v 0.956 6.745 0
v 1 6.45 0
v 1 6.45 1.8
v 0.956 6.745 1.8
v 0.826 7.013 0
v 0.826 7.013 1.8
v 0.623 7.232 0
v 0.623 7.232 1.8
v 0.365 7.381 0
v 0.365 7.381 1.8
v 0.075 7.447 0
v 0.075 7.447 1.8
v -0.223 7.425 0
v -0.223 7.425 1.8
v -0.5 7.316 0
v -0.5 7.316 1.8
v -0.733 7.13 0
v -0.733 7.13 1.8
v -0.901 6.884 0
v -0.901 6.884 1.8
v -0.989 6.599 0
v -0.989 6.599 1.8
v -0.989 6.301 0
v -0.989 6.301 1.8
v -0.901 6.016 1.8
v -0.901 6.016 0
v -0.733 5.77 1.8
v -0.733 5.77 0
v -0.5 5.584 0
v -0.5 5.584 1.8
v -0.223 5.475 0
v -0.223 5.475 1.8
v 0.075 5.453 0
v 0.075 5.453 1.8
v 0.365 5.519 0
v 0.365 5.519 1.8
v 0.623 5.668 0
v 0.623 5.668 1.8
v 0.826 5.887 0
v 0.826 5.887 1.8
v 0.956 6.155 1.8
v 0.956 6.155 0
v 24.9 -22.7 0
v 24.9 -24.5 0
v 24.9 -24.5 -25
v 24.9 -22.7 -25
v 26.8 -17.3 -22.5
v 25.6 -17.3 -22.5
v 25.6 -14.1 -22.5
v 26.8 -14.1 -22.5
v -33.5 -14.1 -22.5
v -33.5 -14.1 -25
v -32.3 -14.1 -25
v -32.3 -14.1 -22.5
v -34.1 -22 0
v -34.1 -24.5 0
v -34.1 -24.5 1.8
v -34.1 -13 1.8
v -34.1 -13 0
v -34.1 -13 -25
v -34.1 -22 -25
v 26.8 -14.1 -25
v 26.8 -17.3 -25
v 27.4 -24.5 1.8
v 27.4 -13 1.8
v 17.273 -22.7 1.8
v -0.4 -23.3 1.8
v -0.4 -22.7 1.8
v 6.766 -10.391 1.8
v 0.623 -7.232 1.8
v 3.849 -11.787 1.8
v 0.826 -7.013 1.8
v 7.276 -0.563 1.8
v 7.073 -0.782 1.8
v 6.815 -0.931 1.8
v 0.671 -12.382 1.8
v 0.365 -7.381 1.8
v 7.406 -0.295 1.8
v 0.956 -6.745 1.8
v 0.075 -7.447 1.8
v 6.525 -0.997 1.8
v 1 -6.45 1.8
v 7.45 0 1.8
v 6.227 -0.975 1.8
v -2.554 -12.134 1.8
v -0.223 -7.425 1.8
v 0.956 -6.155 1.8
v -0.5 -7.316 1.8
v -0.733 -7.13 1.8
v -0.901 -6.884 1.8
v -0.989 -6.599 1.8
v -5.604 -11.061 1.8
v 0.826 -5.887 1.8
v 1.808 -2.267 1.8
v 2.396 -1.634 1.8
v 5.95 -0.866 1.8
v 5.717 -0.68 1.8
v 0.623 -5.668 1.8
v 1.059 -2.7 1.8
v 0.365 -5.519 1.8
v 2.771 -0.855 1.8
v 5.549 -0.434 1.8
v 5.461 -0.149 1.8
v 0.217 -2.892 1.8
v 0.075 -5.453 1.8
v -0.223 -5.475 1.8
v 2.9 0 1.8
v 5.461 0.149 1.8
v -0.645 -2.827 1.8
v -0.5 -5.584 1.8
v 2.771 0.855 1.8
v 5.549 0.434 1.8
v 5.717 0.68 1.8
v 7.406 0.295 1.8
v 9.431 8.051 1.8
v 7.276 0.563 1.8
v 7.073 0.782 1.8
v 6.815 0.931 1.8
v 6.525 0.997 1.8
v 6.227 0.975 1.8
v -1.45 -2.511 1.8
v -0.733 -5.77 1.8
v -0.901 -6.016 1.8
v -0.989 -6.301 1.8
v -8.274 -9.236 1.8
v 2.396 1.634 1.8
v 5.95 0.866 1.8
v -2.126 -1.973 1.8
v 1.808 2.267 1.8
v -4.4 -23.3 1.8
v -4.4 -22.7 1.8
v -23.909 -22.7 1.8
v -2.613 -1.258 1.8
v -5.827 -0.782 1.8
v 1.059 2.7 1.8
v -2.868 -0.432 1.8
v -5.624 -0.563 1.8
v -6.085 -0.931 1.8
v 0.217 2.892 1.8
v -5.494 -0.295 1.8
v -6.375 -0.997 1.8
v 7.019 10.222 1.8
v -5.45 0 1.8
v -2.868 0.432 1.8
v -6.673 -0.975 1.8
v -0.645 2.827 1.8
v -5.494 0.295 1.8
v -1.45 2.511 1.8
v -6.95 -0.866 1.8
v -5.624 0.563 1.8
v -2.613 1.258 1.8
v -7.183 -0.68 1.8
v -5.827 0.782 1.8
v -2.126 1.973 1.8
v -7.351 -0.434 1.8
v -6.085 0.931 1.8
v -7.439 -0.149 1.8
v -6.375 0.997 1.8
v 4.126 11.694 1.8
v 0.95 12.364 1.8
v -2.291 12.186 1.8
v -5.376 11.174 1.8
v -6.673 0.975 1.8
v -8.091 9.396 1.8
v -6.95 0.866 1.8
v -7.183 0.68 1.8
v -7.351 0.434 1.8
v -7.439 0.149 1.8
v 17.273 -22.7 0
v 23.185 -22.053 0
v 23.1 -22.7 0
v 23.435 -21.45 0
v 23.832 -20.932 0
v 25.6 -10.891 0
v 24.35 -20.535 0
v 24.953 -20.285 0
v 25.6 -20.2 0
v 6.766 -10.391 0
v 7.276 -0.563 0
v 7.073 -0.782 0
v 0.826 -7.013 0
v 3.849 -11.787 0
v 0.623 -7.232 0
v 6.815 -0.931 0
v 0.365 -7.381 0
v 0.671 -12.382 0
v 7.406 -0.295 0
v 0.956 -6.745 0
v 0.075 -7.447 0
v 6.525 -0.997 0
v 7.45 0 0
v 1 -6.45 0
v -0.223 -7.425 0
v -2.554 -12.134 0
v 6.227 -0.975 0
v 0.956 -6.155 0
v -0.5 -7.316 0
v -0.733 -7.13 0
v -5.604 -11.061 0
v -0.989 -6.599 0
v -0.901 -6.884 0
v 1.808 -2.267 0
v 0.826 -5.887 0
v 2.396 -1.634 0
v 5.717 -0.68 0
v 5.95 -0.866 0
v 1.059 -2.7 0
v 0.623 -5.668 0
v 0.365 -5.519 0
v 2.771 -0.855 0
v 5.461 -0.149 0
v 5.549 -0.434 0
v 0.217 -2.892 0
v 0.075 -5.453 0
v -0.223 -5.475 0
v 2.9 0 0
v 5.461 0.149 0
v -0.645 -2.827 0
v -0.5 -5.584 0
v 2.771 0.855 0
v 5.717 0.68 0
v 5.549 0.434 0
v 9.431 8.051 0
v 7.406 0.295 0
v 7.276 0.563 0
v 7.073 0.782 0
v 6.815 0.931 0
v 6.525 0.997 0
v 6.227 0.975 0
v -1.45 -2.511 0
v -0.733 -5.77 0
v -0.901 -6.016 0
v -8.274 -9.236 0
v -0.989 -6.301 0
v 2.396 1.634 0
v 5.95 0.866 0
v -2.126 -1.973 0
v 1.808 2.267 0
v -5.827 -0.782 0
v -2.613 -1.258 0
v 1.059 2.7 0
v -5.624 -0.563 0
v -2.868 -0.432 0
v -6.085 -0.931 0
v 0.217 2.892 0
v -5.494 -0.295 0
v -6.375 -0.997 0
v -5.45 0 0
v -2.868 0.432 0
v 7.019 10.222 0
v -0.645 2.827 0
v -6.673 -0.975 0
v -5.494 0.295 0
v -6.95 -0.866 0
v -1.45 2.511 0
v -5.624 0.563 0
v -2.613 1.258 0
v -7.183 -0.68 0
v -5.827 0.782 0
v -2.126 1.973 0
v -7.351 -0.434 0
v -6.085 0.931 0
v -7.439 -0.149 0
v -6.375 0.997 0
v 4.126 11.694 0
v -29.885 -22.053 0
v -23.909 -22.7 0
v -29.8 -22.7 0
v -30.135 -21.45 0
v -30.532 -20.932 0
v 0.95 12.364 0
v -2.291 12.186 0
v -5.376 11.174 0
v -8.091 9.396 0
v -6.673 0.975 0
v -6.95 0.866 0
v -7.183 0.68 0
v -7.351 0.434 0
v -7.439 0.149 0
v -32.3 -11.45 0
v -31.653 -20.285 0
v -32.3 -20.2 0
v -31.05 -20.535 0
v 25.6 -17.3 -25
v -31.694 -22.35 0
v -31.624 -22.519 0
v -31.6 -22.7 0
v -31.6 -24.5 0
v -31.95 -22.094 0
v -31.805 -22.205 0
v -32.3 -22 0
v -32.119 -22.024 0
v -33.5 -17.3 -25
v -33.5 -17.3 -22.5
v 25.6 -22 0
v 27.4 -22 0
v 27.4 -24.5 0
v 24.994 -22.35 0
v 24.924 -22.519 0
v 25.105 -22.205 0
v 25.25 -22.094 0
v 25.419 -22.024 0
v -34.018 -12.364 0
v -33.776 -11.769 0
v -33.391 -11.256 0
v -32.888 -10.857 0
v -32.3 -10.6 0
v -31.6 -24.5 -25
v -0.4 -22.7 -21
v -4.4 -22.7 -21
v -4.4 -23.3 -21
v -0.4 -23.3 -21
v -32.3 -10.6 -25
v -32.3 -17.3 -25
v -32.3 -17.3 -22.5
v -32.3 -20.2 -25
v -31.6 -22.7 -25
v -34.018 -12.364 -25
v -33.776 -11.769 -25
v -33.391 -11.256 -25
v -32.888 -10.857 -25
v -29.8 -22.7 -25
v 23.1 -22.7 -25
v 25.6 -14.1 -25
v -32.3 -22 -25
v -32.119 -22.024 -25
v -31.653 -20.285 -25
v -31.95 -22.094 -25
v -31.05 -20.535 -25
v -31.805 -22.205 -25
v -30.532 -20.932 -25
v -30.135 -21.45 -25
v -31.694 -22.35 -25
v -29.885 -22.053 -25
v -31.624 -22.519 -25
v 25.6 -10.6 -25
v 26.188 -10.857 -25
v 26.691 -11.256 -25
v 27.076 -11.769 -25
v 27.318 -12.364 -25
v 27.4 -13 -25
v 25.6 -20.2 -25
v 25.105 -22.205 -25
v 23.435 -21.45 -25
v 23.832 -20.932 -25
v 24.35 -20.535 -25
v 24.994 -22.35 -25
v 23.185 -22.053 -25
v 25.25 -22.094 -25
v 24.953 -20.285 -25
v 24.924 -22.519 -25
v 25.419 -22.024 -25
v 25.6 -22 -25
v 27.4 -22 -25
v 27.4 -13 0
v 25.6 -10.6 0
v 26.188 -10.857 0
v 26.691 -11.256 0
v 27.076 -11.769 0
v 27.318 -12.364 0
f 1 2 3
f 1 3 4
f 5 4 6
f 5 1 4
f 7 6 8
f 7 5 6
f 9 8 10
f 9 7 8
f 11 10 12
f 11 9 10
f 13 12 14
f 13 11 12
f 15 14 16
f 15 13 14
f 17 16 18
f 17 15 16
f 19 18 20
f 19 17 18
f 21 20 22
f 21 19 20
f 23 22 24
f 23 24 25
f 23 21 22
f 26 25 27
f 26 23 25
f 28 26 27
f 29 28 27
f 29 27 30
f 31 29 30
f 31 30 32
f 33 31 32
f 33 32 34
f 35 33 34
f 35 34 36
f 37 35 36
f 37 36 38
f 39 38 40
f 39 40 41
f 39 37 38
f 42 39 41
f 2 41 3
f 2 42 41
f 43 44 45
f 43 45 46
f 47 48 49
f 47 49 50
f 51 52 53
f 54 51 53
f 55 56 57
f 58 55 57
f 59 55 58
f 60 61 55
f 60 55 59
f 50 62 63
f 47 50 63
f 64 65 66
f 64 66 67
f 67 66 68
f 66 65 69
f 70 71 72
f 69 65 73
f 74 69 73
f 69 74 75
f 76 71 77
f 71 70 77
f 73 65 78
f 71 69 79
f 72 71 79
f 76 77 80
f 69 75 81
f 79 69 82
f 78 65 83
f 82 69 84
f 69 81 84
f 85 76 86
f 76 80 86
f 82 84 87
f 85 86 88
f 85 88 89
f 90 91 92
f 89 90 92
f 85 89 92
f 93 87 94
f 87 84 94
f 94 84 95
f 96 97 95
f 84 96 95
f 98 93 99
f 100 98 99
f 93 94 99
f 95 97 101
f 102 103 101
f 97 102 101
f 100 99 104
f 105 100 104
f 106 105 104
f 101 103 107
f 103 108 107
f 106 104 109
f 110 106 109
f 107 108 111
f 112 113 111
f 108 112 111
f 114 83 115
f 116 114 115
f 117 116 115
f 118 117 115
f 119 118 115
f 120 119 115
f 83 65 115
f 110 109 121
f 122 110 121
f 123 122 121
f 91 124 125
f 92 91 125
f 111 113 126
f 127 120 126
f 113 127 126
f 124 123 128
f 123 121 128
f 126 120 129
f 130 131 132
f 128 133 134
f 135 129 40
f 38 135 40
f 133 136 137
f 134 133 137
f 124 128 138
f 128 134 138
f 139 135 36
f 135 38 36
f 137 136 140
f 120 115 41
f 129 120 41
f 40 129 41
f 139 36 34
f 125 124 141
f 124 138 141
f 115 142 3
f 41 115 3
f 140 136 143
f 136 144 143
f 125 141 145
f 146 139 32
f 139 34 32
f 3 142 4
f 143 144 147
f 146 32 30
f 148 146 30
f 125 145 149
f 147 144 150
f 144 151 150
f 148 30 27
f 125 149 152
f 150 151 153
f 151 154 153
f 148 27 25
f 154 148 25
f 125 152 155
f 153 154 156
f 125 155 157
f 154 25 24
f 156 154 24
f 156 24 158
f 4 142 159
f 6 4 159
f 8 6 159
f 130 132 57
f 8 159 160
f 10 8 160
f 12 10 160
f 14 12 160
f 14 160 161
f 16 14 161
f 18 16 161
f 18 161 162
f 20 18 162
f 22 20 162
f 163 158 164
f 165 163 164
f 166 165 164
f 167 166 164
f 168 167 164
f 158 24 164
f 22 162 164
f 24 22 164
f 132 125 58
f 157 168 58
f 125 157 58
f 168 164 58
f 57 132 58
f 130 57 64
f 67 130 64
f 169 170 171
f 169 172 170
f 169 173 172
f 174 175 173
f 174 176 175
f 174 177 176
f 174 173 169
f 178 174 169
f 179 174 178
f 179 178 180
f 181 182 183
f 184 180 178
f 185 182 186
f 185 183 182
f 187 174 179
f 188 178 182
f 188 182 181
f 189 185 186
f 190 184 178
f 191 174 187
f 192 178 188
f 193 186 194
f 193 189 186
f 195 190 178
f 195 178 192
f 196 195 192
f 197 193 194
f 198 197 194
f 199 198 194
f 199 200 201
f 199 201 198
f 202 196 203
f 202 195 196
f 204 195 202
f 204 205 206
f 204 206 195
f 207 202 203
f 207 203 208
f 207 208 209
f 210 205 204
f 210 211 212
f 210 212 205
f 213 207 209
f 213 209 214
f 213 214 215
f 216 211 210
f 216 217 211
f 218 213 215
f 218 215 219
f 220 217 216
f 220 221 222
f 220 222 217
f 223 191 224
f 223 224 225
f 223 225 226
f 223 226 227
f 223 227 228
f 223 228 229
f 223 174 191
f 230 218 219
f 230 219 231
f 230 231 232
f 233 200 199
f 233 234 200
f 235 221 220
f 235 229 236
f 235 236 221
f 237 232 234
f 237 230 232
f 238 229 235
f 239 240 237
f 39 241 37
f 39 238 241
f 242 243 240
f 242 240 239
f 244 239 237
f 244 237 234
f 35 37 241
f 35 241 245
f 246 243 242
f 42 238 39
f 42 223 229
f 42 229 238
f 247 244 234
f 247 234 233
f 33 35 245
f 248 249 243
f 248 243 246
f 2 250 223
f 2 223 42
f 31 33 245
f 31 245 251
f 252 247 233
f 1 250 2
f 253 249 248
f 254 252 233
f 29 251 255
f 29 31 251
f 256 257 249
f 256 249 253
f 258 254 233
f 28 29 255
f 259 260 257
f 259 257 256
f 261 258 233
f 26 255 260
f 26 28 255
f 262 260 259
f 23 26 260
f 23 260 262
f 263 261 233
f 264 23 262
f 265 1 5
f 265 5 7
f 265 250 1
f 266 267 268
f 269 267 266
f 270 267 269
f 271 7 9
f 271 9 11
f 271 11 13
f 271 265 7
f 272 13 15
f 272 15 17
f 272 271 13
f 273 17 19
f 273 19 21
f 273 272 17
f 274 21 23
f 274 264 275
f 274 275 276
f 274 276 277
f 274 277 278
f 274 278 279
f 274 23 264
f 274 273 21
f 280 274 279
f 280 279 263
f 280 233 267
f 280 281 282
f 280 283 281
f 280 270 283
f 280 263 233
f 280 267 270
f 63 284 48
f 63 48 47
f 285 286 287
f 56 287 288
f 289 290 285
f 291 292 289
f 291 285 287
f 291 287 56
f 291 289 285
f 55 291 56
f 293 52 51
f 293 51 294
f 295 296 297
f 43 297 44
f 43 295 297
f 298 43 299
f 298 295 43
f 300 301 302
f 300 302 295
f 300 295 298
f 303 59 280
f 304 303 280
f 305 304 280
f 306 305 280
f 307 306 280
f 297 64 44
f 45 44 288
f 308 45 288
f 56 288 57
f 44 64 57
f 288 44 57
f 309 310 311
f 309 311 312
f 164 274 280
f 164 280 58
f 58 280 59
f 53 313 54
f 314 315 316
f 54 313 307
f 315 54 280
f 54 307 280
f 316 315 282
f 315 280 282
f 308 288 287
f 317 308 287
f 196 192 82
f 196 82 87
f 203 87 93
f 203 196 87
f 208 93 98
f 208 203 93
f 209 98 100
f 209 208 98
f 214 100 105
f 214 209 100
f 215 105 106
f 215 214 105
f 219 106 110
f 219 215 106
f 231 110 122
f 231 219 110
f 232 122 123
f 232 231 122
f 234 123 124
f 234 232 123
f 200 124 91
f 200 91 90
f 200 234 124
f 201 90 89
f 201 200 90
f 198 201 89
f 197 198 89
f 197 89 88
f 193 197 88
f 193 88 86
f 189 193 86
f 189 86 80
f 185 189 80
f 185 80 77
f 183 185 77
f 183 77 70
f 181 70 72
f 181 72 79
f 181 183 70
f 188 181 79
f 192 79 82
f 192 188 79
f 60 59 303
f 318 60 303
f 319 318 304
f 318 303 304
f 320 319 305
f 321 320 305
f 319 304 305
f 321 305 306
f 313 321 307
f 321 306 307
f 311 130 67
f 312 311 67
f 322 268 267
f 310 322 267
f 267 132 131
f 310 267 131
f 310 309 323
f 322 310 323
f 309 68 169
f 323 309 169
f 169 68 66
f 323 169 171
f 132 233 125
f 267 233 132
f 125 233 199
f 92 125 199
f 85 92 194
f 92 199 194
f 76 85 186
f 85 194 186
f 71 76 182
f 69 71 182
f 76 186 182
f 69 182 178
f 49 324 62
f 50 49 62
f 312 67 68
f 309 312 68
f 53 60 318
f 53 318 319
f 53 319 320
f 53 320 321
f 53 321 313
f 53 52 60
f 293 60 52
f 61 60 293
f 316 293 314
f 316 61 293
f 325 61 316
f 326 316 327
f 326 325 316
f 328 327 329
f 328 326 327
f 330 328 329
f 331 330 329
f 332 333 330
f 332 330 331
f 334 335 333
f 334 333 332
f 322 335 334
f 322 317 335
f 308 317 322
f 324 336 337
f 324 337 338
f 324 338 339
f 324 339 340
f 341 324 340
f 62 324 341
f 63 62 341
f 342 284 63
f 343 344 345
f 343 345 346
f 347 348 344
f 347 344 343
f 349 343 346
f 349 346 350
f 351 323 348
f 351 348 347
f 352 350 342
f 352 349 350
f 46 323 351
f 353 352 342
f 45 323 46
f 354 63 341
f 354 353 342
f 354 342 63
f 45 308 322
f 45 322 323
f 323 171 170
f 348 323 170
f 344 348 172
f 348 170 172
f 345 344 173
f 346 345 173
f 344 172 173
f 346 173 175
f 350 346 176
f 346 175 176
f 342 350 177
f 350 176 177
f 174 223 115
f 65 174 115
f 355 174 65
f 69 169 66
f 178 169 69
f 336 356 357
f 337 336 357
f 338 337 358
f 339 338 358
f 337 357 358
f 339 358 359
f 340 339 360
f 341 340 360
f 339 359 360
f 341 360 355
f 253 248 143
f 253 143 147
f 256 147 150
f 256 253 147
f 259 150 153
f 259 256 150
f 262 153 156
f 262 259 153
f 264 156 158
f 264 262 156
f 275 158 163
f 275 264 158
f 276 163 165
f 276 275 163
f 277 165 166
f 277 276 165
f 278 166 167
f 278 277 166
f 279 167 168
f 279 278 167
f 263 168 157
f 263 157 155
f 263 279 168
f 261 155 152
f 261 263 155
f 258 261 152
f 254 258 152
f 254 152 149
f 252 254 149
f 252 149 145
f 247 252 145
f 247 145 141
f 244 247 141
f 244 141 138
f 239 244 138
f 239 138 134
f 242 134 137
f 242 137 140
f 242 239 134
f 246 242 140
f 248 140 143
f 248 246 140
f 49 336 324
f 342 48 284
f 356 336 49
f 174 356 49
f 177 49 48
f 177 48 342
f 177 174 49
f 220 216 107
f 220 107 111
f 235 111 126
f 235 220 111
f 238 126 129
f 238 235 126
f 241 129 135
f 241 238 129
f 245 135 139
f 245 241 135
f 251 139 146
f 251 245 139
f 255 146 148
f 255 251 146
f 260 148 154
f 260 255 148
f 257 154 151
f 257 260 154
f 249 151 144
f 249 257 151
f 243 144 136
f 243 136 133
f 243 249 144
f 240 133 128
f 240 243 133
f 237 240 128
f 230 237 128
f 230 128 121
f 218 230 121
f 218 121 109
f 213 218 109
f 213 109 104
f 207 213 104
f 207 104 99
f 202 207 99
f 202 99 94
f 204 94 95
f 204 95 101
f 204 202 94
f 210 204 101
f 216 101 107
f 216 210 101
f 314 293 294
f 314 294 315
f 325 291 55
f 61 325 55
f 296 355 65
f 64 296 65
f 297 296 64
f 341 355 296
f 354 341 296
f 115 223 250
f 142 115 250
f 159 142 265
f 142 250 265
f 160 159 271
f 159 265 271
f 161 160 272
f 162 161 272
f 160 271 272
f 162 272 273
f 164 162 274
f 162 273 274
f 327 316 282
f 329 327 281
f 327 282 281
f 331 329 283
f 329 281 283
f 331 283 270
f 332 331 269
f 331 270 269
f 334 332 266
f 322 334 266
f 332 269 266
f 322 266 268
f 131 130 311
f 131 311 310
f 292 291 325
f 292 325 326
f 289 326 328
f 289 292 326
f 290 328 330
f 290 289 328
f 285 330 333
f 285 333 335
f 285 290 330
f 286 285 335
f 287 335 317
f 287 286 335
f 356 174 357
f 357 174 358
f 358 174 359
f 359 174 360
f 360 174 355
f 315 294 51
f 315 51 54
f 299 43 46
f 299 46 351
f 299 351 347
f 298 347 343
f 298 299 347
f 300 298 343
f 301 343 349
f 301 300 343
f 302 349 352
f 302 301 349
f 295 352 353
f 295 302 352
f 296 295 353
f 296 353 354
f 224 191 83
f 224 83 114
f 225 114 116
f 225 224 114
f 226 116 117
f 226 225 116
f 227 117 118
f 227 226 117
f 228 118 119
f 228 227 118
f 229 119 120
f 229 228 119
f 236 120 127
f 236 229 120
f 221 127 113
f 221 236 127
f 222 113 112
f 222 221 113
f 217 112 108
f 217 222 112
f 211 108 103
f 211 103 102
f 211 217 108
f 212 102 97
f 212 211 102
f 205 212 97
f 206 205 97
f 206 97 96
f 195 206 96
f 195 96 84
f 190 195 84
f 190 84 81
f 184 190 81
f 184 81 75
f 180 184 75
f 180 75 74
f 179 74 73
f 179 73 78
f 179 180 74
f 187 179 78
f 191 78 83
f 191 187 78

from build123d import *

# Parameters (mm, degrees)
SKETCH_R        = 1
SKETCH_R_2      = 2.9
PAD_DEPTH       = 1.8
PAD001_DEPTH    = 25
SKETCH004_W     = 4
SKETCH004_H     = 0.6
POCKET_DEPTH    = 22.8
SKETCH005_W     = 1.2
SKETCH005_H     = 3.2
POCKET001_DEPTH = 2.5


with BuildPart() as part:
    # Sketch → Pad (new body)
    with BuildSketch(Plane.XY):
        with BuildLine():
            Line((9.431274, 8.050532), (27.4, -13))
            Line((27.4, -13), (27.4, -24.5))
            Line((27.4, -24.5), (-34.1, -24.5))
            Line((-34.1, -24.5), (-34.1, -13))
            Line((-8.091275, 9.396344), (-34.1, -13))
            ThreePointArc((9.431274, 8.050532), (0.94958, 12.363588), (-8.091275, 9.396344))
        make_face()
        with Locations((6.45, 0)):
            Circle(SKETCH_R, mode=Mode.SUBTRACT)
        with Locations((-6.45, 0)):
            Circle(SKETCH_R, mode=Mode.SUBTRACT)
        with Locations((0, 6.45)):
            Circle(SKETCH_R, mode=Mode.SUBTRACT)
        with Locations((0, -6.45)):
            Circle(SKETCH_R, mode=Mode.SUBTRACT)
        Circle(SKETCH_R_2, mode=Mode.SUBTRACT)
        with BuildLine():
            Line((-8.273758, -9.236066), (-23.909335, -22.7))
            Line((-23.909335, -22.7), (17.273072, -22.7))
            Line((17.273072, -22.7), (6.766294, -10.391211))
            ThreePointArc((-8.273758, -9.236066), (-0.94958, -12.363588), (6.766294, -10.391211))
        make_face(mode=Mode.SUBTRACT)
    extrude(amount=PAD_DEPTH)

    # Sketch001 → Pad001 (new body)
    with BuildSketch(Plane(origin=(0, 0, 0), x_dir=(1, 0, 0), z_dir=(0, 0, -1))):
        with BuildLine():
            Line((24.9, 24.5), (-31.6, 24.5))
            Line((-31.6, 24.5), (-31.6, 22.7))
            ThreePointArc((-32.3, 22), (-31.805025, 22.205025), (-31.6, 22.7))
            Line((-32.3, 22), (-34.1, 22))
            Line((-34.1, 22), (-34.1, 13))
            ThreePointArc((-34.1, 13), (-33.6, 11.5), (-32.3, 10.6))
            Line((-32.3, 10.6), (-32.3, 20.2))
            ThreePointArc((-32.3, 20.2), (-30.532233, 20.932233), (-29.8, 22.7))
            Line((-29.8, 22.7), (23.1, 22.7))
            ThreePointArc((23.1, 22.7), (23.832233, 20.932233), (25.6, 20.2))
            Line((25.6, 10.6), (25.6, 20.2))
            ThreePointArc((25.6, 10.6), (26.9, 11.5), (27.4, 13))
            Line((27.4, 22), (27.4, 13))
            Line((25.6, 22), (27.4, 22))
            ThreePointArc((24.9, 22.7), (25.105025, 22.205025), (25.6, 22))
            Line((24.9, 24.5), (24.9, 22.7))
        make_face()
    extrude(amount=PAD001_DEPTH)

    # Sketch004 → Pocket (cut)
    with BuildSketch(Plane.XY.offset(1.8)):
        with Locations((-2.4, -23)):
            Rectangle(SKETCH004_W, SKETCH004_H)
    extrude(amount=-POCKET_DEPTH, mode=Mode.SUBTRACT)

    # Sketch005 → Pocket001 (cut)
    with BuildSketch(Plane(origin=(0, 0, -25), x_dir=(1, 0, 0), z_dir=(0, 0, -1))):
        with Locations((26.2, 15.7)):
            Rectangle(SKETCH005_W, SKETCH005_H)
        with Locations((-32.9, 15.7)):
            Rectangle(SKETCH005_W, SKETCH005_H)
    extrude(amount=-POCKET001_DEPTH, mode=Mode.SUBTRACT)


solid = part.part
